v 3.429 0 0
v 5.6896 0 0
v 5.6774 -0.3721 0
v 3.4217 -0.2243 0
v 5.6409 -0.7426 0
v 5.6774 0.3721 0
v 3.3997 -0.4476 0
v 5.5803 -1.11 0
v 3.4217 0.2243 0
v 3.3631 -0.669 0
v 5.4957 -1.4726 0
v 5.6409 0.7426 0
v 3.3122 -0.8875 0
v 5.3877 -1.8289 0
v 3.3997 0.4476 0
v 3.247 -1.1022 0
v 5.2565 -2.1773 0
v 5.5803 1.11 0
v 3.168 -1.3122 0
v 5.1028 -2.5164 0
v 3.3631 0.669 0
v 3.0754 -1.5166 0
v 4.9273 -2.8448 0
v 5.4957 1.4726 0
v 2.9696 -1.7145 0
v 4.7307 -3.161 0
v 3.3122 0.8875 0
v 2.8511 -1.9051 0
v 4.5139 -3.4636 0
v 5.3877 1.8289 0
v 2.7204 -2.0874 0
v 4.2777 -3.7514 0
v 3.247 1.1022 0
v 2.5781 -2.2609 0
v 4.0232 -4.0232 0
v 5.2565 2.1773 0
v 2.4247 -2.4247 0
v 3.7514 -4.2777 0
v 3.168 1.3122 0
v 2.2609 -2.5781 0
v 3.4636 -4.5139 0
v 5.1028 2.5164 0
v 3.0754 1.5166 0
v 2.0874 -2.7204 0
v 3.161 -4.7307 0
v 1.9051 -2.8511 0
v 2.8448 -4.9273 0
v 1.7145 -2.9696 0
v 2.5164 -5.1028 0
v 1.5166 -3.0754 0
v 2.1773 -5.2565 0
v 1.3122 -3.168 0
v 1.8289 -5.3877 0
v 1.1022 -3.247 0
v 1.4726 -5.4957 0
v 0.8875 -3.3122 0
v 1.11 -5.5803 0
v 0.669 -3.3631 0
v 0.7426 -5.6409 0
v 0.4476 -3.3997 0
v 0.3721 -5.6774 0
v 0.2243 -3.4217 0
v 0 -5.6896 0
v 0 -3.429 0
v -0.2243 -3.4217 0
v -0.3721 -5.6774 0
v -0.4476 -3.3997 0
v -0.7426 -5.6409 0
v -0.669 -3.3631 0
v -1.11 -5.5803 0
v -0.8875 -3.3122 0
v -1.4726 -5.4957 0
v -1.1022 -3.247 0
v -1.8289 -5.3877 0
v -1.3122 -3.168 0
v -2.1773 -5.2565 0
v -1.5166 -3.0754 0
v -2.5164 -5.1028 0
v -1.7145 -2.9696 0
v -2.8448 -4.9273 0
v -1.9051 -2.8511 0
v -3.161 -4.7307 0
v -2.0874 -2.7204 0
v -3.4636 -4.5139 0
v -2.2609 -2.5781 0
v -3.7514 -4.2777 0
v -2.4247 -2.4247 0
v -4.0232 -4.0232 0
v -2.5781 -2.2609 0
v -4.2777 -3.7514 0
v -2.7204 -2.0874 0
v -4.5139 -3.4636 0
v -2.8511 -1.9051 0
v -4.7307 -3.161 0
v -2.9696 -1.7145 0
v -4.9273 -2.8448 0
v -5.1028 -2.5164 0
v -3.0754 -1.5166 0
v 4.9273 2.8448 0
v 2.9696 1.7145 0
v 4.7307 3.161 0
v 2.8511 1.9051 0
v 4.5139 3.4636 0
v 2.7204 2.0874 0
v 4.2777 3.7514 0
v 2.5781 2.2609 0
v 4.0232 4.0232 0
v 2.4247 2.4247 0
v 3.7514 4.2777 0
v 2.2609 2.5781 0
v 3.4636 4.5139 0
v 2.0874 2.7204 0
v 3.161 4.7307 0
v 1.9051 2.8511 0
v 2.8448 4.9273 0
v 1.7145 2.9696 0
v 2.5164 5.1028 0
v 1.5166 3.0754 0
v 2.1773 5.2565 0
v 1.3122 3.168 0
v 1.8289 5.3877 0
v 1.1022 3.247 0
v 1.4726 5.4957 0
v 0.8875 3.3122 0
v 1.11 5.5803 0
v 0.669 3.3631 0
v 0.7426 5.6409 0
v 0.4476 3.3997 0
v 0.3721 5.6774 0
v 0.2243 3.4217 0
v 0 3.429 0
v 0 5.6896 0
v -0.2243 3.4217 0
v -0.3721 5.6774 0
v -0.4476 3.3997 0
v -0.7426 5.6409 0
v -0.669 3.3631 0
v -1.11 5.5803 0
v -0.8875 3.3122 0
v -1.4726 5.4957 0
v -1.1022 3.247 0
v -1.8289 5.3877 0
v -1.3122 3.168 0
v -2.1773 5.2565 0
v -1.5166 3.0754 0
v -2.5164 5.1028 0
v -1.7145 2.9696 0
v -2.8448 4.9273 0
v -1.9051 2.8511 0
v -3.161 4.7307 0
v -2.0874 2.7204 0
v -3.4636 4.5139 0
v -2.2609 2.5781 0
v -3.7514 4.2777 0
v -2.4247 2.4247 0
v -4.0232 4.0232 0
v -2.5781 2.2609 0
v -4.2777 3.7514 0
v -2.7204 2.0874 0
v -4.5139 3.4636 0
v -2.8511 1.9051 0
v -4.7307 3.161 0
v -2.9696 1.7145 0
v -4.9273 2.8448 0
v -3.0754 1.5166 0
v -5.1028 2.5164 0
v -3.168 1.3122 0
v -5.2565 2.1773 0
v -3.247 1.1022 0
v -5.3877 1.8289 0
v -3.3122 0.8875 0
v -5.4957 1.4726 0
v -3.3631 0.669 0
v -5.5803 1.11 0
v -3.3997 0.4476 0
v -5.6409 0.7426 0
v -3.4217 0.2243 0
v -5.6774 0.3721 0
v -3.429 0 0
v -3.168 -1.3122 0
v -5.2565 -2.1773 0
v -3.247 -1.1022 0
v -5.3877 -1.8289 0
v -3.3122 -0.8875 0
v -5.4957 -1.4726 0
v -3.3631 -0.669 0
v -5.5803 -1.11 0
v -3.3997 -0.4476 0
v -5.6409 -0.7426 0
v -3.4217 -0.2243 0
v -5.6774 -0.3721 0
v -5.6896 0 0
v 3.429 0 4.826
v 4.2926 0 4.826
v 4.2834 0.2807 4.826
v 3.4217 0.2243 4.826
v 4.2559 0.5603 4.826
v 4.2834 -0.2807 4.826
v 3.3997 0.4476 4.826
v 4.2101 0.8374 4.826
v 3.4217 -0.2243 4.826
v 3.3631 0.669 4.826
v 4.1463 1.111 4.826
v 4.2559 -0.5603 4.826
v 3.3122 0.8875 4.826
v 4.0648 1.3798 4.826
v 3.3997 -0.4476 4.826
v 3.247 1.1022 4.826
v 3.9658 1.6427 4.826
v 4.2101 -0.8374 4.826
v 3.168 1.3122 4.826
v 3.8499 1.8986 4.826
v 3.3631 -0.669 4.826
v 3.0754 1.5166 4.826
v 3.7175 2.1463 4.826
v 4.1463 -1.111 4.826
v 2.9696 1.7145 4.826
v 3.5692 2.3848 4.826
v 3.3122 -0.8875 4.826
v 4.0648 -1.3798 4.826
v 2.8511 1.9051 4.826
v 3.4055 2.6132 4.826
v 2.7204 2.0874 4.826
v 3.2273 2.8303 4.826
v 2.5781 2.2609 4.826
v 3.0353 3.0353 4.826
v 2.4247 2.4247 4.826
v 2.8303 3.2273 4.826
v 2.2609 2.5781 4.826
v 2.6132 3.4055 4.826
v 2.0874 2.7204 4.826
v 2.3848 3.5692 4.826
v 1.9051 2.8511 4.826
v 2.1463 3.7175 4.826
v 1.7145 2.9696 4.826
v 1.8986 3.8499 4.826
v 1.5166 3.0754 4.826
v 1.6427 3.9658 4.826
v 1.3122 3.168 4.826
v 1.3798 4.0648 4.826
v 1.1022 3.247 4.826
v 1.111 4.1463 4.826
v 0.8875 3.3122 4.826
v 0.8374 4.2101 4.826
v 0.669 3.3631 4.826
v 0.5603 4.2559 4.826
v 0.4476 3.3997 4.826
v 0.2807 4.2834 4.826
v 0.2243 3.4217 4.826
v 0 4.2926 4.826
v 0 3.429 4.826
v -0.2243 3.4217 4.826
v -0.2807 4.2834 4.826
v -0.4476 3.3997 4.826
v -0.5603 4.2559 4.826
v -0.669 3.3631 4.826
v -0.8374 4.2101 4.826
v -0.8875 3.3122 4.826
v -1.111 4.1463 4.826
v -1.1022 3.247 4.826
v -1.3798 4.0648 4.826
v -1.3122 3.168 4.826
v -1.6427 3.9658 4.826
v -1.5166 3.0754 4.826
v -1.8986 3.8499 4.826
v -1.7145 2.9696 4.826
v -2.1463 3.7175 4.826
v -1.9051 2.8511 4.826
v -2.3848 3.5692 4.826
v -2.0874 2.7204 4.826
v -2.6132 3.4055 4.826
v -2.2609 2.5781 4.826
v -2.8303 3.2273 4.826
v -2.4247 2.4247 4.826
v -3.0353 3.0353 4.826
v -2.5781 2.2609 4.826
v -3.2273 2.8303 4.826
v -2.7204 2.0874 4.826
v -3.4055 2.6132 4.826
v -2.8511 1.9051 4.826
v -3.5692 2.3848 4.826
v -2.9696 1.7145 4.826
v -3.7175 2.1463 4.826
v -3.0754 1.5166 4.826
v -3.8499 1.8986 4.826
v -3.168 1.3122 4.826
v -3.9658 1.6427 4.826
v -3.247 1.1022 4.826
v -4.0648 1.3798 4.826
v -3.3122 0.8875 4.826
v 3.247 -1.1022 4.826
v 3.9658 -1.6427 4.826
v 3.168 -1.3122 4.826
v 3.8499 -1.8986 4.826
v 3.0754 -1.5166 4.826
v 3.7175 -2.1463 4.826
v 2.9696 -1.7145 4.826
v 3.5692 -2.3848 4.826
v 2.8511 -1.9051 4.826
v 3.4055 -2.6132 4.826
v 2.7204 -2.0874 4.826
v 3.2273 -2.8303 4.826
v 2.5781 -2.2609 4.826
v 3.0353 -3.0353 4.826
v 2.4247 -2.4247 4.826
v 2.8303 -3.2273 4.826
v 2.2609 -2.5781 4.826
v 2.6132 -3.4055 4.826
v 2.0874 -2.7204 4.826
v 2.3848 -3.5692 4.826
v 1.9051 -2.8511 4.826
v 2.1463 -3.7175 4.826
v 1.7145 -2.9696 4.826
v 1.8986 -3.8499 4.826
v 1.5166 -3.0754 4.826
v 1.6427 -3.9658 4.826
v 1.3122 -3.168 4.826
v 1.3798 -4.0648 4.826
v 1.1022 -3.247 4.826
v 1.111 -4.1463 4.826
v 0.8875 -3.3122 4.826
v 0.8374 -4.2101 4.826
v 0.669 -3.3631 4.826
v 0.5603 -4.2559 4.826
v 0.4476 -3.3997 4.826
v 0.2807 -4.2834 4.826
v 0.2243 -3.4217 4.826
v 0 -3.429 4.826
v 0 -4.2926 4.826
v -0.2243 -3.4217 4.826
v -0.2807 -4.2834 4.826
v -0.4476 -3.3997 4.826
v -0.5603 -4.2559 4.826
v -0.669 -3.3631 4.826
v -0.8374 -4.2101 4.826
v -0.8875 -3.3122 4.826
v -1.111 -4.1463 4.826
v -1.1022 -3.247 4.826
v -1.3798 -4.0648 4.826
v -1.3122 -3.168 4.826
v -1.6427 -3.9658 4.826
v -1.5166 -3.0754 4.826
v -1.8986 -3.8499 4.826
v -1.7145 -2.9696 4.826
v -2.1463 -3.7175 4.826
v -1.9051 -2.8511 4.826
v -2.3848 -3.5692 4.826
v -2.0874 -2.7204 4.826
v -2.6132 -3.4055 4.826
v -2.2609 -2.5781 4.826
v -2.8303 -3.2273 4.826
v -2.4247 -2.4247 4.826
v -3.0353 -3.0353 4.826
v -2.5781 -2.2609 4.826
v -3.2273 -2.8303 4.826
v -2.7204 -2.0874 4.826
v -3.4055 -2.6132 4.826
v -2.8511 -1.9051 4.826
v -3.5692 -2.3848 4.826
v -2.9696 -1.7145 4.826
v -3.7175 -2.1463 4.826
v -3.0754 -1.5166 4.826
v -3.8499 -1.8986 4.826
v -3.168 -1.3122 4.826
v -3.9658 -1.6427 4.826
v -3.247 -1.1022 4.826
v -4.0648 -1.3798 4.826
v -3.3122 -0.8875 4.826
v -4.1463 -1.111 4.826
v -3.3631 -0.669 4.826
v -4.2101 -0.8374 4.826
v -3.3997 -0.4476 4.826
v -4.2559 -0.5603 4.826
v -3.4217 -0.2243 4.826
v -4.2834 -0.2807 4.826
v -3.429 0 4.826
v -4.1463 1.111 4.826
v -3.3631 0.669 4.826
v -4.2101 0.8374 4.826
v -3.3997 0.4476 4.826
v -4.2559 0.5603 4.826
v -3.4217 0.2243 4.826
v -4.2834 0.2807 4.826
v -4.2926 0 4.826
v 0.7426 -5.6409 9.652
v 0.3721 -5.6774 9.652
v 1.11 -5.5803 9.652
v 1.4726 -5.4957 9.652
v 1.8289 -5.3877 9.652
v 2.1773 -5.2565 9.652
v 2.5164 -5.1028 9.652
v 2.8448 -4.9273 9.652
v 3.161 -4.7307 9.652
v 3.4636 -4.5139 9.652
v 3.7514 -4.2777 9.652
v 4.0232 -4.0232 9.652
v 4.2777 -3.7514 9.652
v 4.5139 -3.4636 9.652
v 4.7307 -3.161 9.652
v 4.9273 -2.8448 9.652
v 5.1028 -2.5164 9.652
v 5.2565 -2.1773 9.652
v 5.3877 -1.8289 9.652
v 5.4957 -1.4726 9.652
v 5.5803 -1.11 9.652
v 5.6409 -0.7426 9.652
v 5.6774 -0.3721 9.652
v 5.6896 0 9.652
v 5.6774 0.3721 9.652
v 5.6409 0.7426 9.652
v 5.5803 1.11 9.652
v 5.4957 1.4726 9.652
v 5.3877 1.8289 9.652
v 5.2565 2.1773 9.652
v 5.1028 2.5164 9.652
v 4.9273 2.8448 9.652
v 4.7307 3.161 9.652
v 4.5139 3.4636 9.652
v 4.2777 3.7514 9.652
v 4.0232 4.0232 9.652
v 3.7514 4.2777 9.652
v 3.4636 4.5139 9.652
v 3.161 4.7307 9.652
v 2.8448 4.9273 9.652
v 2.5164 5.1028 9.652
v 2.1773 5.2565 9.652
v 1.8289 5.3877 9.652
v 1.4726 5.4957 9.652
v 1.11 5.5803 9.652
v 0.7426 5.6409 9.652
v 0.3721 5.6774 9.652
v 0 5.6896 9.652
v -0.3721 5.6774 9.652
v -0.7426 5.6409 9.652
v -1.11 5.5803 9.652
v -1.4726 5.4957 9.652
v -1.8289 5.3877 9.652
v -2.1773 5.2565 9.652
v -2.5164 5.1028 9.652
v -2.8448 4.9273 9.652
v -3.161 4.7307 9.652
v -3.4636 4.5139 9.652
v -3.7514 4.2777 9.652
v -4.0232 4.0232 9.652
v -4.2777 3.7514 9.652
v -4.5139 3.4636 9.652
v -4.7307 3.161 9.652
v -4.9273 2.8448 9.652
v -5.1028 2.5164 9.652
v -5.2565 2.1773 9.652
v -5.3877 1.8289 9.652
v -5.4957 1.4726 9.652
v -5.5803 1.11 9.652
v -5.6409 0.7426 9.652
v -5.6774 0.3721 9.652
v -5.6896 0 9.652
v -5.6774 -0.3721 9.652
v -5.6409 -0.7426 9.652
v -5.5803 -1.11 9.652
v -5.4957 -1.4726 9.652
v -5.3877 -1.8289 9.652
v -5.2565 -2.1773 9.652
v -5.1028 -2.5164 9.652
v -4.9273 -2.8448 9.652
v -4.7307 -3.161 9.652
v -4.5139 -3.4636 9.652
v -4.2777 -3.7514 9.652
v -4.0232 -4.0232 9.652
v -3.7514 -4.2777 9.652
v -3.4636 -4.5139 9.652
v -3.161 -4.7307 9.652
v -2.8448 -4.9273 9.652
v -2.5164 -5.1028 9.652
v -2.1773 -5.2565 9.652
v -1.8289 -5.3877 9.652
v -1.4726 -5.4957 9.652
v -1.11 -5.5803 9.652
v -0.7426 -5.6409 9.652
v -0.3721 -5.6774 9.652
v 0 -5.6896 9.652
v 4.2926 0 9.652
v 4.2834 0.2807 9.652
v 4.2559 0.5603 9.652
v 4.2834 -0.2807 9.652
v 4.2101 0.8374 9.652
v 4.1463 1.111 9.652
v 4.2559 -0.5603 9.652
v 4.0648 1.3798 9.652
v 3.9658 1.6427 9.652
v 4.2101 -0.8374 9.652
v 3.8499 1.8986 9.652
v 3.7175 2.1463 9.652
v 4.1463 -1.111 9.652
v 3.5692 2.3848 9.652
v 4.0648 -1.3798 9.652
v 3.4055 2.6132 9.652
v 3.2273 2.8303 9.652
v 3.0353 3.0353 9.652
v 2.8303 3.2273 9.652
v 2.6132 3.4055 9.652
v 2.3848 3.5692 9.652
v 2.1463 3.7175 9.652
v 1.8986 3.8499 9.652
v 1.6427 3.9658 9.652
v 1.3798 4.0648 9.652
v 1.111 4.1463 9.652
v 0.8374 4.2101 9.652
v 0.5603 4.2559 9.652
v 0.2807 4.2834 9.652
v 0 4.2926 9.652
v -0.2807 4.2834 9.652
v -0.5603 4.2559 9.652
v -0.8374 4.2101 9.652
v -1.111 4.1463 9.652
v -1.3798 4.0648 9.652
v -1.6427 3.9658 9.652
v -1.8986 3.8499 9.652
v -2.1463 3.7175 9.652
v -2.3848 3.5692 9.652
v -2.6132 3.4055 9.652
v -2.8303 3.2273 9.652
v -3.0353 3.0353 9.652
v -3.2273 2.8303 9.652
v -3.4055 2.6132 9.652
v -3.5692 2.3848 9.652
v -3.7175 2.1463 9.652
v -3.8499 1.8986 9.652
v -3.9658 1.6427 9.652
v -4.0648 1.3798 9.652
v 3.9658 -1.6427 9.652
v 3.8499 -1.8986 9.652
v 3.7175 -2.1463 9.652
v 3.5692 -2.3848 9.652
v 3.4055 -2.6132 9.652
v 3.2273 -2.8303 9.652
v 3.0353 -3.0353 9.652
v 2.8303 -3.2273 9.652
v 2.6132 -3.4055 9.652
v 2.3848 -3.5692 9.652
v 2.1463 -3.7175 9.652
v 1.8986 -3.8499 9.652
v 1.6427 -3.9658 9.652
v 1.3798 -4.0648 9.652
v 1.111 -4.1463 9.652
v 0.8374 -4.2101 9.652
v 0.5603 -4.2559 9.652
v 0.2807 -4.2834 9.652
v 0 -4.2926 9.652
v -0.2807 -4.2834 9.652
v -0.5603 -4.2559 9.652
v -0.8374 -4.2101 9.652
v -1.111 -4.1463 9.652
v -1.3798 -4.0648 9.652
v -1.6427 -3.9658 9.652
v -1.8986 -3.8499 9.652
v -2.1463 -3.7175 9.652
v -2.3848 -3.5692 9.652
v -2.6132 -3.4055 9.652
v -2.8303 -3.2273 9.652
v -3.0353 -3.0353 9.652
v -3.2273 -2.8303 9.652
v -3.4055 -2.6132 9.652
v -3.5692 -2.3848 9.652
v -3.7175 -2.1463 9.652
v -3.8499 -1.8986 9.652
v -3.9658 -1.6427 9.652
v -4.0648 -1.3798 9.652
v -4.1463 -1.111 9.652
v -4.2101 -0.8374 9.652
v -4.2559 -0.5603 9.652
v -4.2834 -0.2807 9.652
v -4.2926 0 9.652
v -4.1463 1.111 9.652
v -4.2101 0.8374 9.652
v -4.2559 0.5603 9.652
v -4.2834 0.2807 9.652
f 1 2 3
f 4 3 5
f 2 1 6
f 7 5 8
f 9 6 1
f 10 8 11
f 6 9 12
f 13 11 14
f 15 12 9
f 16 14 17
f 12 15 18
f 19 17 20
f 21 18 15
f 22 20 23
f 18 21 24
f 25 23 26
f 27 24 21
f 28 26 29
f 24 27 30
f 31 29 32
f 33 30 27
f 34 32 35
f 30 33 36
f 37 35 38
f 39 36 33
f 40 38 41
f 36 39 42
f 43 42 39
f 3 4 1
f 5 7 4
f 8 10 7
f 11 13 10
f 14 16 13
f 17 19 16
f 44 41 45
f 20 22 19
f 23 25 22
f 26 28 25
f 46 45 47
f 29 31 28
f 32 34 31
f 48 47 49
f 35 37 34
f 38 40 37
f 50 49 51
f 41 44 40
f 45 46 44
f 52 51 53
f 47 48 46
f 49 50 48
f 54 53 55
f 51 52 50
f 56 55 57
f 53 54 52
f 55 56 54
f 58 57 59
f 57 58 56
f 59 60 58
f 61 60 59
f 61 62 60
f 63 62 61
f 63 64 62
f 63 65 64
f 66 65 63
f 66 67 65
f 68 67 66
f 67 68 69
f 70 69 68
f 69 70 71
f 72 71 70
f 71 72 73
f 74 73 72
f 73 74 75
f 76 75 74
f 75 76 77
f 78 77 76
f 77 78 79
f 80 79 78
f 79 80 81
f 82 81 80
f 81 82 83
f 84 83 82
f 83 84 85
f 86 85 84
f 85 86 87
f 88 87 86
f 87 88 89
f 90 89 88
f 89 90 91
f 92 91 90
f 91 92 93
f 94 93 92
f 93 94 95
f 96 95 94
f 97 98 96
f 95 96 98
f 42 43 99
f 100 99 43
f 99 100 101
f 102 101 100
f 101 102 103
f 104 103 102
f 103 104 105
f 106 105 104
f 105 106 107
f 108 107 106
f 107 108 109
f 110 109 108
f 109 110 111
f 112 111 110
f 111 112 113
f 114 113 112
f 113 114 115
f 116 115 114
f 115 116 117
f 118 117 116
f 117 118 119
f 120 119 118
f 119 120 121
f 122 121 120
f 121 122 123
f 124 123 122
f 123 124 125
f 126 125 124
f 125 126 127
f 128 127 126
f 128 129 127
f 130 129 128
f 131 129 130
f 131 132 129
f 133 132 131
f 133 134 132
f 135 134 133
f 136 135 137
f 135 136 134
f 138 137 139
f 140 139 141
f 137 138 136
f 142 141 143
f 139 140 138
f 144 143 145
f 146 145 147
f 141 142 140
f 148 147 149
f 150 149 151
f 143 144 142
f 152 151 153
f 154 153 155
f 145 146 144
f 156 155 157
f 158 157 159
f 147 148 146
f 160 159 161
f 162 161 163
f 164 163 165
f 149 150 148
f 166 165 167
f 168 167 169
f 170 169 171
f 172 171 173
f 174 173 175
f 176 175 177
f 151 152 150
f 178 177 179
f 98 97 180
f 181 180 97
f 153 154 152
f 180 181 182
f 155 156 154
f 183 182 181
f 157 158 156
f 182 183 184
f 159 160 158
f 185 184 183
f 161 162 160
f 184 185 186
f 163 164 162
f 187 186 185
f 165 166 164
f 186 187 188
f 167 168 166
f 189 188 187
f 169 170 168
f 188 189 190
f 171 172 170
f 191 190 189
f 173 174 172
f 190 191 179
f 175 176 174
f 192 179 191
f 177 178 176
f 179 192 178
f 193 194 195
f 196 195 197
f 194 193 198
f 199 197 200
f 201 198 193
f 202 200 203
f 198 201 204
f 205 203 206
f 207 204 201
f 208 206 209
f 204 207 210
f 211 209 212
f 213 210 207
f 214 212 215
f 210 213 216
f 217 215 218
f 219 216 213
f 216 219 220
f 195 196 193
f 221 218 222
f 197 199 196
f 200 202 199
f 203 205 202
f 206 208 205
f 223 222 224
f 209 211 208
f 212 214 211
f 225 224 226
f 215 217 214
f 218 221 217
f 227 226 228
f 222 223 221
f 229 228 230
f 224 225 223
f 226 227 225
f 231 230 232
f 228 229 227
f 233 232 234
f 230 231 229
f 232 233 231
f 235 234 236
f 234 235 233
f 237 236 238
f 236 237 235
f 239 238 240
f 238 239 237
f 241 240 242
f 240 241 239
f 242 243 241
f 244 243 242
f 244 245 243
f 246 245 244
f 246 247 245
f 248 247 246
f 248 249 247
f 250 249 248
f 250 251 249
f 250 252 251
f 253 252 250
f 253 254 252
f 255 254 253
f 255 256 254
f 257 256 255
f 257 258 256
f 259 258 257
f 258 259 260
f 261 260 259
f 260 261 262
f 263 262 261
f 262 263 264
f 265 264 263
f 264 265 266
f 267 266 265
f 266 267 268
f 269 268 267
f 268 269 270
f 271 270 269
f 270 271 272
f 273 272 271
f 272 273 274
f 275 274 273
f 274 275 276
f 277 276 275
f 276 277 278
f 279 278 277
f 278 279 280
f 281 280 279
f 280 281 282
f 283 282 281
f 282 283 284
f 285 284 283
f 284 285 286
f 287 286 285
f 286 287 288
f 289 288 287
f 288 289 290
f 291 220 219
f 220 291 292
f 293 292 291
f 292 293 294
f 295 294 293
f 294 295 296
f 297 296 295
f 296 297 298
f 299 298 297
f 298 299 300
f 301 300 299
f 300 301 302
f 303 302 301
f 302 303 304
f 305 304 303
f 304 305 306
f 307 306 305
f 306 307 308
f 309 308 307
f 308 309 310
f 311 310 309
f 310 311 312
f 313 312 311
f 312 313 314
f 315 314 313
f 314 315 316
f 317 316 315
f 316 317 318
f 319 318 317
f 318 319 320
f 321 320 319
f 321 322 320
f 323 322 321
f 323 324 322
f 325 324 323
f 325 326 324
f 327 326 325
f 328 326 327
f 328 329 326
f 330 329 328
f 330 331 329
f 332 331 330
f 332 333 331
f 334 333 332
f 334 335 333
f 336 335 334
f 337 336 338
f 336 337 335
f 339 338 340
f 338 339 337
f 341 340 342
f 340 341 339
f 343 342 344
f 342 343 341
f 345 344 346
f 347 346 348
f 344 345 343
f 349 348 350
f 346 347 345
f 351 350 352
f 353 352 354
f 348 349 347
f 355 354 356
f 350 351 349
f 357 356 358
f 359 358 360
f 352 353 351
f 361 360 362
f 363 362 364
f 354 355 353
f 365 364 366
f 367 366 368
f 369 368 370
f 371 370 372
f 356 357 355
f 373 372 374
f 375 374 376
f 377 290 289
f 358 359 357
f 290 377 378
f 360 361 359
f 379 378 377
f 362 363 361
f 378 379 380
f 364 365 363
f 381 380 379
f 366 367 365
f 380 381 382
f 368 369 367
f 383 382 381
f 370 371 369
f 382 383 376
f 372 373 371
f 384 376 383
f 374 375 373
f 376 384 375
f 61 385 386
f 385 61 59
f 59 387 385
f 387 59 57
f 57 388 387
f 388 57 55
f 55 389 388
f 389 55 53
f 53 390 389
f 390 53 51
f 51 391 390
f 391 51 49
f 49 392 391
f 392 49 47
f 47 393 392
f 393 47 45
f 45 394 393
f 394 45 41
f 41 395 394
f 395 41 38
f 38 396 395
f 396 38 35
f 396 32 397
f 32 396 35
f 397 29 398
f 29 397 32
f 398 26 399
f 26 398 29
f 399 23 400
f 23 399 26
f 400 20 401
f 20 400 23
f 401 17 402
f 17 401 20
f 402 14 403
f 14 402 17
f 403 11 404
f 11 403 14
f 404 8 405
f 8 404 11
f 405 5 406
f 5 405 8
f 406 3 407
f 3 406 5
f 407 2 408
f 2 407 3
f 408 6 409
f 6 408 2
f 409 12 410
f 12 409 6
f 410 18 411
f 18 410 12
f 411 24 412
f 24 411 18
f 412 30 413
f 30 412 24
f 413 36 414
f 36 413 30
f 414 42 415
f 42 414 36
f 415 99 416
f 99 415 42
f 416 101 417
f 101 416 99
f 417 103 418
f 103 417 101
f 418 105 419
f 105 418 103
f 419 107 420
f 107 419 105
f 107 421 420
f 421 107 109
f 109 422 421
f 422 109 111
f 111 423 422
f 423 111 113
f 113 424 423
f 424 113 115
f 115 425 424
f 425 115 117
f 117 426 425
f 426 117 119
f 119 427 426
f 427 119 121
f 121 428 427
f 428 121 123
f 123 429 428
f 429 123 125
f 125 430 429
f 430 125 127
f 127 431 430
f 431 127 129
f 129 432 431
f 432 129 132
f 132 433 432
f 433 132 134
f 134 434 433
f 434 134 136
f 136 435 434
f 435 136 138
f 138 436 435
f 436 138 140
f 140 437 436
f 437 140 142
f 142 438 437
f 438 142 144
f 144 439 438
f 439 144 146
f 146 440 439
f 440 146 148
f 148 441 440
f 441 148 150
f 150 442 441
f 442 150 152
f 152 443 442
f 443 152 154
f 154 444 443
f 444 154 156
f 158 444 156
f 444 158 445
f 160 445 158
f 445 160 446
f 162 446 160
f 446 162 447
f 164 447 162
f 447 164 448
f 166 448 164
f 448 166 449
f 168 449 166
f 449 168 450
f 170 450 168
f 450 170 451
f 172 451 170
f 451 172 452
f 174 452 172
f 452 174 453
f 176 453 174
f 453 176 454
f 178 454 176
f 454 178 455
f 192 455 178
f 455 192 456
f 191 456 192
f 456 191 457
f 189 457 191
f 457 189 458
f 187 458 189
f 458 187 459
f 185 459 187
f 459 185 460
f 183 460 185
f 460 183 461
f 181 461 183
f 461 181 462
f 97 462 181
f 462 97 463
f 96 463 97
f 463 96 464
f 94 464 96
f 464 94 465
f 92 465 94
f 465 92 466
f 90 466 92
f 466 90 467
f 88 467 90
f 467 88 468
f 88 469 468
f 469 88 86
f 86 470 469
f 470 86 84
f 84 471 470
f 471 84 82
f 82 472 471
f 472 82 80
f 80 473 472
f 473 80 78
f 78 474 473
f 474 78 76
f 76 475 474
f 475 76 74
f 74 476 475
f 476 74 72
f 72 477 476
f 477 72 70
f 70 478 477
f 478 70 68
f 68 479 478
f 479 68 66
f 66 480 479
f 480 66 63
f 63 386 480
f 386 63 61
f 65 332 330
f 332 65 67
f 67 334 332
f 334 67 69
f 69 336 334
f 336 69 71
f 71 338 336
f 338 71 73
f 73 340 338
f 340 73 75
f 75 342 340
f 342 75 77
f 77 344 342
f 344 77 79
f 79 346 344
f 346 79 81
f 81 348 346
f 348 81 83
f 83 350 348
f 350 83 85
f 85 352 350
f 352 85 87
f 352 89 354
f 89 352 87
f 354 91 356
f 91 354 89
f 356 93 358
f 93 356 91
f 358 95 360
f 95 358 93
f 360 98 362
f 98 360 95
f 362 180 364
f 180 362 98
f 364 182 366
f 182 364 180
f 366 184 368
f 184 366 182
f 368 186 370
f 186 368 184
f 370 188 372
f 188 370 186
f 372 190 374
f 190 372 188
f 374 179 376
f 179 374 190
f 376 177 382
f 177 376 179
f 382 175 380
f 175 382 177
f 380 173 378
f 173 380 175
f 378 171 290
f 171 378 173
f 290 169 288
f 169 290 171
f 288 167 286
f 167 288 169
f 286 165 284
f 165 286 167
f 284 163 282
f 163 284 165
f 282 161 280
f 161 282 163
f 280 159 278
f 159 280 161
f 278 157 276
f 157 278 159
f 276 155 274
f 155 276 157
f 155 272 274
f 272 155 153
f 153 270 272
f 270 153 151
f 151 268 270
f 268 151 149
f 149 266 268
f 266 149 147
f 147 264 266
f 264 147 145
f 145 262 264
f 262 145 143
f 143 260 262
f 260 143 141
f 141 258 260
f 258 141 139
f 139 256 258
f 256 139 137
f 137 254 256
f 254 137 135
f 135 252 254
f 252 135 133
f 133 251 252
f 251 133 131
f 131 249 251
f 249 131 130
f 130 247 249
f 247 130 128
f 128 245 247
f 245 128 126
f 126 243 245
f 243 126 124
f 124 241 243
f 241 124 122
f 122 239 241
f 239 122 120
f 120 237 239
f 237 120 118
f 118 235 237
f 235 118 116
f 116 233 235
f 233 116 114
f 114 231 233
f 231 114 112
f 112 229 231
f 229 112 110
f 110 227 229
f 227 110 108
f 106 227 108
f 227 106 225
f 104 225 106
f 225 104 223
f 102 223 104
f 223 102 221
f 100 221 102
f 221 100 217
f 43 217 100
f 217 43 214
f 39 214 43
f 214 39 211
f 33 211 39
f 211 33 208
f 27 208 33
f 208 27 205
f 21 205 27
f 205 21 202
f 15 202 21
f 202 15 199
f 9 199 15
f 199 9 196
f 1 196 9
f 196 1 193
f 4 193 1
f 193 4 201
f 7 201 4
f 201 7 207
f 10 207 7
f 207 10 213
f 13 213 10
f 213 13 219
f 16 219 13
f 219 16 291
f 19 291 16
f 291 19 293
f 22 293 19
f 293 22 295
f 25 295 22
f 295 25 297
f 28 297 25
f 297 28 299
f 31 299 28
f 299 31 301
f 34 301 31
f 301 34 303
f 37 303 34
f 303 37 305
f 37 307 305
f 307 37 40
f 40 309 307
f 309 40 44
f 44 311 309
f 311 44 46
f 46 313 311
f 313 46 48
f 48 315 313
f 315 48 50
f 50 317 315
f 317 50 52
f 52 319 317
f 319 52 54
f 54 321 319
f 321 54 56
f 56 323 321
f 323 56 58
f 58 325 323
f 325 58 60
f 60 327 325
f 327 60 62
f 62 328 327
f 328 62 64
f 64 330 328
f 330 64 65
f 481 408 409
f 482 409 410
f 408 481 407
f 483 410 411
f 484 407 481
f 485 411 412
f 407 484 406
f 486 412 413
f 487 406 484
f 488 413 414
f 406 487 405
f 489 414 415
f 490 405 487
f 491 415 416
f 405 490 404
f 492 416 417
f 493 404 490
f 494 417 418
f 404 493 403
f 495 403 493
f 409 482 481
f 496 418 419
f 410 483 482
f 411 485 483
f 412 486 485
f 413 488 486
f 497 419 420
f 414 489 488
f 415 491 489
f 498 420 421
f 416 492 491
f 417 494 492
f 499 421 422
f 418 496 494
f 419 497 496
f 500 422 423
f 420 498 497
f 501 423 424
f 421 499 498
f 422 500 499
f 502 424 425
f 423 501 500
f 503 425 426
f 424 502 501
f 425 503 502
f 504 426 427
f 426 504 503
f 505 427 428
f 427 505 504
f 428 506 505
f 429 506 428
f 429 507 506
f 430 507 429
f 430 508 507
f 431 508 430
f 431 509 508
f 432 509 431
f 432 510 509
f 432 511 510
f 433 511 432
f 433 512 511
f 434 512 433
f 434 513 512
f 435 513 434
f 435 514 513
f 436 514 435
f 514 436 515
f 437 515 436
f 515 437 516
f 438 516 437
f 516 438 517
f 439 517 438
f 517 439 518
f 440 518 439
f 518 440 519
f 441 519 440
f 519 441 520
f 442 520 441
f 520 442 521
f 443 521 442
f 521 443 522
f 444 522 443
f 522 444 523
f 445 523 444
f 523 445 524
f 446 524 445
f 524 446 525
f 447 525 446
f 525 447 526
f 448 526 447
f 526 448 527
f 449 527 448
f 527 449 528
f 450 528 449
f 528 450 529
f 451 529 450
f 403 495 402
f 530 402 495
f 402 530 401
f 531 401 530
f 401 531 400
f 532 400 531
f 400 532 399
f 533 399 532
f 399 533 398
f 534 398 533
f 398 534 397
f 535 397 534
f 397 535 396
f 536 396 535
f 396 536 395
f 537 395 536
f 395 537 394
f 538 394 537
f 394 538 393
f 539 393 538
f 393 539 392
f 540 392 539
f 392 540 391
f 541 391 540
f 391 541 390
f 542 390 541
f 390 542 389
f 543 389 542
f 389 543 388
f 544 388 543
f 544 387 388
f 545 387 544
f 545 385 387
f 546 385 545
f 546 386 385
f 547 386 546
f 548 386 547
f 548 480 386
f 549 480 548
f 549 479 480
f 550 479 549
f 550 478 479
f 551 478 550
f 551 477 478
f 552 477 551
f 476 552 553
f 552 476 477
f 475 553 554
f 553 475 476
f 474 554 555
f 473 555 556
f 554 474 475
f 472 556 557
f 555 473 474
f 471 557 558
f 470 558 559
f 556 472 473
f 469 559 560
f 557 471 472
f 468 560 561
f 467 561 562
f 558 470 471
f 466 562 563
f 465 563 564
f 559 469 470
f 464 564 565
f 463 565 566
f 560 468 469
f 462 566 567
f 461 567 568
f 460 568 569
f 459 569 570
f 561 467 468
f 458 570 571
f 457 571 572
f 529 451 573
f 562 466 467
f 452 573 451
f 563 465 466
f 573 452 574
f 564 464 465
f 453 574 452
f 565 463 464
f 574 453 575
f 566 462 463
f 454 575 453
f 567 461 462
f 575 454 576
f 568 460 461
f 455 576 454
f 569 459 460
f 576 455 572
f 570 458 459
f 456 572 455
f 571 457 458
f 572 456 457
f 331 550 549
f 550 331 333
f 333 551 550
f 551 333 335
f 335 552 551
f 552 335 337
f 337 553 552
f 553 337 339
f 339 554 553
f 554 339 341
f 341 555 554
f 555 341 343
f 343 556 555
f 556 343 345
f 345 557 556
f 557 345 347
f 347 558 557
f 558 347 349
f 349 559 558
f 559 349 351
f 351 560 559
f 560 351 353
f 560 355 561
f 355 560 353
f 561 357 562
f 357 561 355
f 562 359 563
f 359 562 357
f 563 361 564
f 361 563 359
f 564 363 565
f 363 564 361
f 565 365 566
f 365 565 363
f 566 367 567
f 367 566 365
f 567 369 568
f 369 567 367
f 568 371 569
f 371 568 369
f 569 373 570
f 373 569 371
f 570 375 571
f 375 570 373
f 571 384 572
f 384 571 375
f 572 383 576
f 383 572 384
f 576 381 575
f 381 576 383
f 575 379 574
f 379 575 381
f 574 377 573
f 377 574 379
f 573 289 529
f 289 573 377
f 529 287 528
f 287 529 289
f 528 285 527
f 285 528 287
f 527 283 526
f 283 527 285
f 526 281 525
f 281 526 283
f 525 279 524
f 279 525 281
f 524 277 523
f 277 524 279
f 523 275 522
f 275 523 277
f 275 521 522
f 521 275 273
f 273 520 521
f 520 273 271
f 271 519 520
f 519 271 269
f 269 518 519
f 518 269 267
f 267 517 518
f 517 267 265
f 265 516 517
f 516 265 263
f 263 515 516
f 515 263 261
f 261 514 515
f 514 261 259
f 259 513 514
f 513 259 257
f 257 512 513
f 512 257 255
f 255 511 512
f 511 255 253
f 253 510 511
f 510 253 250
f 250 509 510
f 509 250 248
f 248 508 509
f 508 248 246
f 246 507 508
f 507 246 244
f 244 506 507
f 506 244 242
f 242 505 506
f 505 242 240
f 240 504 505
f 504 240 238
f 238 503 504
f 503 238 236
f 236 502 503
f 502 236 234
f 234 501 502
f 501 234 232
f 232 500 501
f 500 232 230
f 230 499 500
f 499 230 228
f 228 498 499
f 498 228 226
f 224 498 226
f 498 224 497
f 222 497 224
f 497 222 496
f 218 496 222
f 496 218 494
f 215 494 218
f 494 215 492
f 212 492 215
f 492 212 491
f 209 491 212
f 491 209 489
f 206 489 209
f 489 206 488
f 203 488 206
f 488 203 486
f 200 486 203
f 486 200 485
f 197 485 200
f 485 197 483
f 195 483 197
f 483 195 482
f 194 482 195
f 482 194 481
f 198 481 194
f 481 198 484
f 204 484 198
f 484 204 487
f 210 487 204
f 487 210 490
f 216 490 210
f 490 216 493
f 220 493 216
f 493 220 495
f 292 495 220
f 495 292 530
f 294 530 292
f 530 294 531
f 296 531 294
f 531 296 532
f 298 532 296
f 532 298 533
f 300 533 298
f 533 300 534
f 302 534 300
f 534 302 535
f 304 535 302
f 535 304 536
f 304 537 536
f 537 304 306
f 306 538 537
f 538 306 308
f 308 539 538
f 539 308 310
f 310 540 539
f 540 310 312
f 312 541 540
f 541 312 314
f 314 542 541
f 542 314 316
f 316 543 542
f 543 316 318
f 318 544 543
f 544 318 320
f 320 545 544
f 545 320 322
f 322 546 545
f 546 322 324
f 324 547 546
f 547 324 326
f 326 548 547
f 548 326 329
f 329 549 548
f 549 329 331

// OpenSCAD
ViewScale = [0.0254, 0.0254, 0.0254];

module motor()
{
    linear_extrude(190)
    difference()
    {
        circle(224,,$fn=96);
        circle(135,,$fn=96);
    }
}

module shaft()
{
    linear_extrude(190)
    difference()
    {
        circle(224,,$fn=96);
        circle(169,,$fn=96);
    }
}


scale(ViewScale)
{
    union()
    {
        motor();
        translate([0, 0,190])  shaft();
    }
}
